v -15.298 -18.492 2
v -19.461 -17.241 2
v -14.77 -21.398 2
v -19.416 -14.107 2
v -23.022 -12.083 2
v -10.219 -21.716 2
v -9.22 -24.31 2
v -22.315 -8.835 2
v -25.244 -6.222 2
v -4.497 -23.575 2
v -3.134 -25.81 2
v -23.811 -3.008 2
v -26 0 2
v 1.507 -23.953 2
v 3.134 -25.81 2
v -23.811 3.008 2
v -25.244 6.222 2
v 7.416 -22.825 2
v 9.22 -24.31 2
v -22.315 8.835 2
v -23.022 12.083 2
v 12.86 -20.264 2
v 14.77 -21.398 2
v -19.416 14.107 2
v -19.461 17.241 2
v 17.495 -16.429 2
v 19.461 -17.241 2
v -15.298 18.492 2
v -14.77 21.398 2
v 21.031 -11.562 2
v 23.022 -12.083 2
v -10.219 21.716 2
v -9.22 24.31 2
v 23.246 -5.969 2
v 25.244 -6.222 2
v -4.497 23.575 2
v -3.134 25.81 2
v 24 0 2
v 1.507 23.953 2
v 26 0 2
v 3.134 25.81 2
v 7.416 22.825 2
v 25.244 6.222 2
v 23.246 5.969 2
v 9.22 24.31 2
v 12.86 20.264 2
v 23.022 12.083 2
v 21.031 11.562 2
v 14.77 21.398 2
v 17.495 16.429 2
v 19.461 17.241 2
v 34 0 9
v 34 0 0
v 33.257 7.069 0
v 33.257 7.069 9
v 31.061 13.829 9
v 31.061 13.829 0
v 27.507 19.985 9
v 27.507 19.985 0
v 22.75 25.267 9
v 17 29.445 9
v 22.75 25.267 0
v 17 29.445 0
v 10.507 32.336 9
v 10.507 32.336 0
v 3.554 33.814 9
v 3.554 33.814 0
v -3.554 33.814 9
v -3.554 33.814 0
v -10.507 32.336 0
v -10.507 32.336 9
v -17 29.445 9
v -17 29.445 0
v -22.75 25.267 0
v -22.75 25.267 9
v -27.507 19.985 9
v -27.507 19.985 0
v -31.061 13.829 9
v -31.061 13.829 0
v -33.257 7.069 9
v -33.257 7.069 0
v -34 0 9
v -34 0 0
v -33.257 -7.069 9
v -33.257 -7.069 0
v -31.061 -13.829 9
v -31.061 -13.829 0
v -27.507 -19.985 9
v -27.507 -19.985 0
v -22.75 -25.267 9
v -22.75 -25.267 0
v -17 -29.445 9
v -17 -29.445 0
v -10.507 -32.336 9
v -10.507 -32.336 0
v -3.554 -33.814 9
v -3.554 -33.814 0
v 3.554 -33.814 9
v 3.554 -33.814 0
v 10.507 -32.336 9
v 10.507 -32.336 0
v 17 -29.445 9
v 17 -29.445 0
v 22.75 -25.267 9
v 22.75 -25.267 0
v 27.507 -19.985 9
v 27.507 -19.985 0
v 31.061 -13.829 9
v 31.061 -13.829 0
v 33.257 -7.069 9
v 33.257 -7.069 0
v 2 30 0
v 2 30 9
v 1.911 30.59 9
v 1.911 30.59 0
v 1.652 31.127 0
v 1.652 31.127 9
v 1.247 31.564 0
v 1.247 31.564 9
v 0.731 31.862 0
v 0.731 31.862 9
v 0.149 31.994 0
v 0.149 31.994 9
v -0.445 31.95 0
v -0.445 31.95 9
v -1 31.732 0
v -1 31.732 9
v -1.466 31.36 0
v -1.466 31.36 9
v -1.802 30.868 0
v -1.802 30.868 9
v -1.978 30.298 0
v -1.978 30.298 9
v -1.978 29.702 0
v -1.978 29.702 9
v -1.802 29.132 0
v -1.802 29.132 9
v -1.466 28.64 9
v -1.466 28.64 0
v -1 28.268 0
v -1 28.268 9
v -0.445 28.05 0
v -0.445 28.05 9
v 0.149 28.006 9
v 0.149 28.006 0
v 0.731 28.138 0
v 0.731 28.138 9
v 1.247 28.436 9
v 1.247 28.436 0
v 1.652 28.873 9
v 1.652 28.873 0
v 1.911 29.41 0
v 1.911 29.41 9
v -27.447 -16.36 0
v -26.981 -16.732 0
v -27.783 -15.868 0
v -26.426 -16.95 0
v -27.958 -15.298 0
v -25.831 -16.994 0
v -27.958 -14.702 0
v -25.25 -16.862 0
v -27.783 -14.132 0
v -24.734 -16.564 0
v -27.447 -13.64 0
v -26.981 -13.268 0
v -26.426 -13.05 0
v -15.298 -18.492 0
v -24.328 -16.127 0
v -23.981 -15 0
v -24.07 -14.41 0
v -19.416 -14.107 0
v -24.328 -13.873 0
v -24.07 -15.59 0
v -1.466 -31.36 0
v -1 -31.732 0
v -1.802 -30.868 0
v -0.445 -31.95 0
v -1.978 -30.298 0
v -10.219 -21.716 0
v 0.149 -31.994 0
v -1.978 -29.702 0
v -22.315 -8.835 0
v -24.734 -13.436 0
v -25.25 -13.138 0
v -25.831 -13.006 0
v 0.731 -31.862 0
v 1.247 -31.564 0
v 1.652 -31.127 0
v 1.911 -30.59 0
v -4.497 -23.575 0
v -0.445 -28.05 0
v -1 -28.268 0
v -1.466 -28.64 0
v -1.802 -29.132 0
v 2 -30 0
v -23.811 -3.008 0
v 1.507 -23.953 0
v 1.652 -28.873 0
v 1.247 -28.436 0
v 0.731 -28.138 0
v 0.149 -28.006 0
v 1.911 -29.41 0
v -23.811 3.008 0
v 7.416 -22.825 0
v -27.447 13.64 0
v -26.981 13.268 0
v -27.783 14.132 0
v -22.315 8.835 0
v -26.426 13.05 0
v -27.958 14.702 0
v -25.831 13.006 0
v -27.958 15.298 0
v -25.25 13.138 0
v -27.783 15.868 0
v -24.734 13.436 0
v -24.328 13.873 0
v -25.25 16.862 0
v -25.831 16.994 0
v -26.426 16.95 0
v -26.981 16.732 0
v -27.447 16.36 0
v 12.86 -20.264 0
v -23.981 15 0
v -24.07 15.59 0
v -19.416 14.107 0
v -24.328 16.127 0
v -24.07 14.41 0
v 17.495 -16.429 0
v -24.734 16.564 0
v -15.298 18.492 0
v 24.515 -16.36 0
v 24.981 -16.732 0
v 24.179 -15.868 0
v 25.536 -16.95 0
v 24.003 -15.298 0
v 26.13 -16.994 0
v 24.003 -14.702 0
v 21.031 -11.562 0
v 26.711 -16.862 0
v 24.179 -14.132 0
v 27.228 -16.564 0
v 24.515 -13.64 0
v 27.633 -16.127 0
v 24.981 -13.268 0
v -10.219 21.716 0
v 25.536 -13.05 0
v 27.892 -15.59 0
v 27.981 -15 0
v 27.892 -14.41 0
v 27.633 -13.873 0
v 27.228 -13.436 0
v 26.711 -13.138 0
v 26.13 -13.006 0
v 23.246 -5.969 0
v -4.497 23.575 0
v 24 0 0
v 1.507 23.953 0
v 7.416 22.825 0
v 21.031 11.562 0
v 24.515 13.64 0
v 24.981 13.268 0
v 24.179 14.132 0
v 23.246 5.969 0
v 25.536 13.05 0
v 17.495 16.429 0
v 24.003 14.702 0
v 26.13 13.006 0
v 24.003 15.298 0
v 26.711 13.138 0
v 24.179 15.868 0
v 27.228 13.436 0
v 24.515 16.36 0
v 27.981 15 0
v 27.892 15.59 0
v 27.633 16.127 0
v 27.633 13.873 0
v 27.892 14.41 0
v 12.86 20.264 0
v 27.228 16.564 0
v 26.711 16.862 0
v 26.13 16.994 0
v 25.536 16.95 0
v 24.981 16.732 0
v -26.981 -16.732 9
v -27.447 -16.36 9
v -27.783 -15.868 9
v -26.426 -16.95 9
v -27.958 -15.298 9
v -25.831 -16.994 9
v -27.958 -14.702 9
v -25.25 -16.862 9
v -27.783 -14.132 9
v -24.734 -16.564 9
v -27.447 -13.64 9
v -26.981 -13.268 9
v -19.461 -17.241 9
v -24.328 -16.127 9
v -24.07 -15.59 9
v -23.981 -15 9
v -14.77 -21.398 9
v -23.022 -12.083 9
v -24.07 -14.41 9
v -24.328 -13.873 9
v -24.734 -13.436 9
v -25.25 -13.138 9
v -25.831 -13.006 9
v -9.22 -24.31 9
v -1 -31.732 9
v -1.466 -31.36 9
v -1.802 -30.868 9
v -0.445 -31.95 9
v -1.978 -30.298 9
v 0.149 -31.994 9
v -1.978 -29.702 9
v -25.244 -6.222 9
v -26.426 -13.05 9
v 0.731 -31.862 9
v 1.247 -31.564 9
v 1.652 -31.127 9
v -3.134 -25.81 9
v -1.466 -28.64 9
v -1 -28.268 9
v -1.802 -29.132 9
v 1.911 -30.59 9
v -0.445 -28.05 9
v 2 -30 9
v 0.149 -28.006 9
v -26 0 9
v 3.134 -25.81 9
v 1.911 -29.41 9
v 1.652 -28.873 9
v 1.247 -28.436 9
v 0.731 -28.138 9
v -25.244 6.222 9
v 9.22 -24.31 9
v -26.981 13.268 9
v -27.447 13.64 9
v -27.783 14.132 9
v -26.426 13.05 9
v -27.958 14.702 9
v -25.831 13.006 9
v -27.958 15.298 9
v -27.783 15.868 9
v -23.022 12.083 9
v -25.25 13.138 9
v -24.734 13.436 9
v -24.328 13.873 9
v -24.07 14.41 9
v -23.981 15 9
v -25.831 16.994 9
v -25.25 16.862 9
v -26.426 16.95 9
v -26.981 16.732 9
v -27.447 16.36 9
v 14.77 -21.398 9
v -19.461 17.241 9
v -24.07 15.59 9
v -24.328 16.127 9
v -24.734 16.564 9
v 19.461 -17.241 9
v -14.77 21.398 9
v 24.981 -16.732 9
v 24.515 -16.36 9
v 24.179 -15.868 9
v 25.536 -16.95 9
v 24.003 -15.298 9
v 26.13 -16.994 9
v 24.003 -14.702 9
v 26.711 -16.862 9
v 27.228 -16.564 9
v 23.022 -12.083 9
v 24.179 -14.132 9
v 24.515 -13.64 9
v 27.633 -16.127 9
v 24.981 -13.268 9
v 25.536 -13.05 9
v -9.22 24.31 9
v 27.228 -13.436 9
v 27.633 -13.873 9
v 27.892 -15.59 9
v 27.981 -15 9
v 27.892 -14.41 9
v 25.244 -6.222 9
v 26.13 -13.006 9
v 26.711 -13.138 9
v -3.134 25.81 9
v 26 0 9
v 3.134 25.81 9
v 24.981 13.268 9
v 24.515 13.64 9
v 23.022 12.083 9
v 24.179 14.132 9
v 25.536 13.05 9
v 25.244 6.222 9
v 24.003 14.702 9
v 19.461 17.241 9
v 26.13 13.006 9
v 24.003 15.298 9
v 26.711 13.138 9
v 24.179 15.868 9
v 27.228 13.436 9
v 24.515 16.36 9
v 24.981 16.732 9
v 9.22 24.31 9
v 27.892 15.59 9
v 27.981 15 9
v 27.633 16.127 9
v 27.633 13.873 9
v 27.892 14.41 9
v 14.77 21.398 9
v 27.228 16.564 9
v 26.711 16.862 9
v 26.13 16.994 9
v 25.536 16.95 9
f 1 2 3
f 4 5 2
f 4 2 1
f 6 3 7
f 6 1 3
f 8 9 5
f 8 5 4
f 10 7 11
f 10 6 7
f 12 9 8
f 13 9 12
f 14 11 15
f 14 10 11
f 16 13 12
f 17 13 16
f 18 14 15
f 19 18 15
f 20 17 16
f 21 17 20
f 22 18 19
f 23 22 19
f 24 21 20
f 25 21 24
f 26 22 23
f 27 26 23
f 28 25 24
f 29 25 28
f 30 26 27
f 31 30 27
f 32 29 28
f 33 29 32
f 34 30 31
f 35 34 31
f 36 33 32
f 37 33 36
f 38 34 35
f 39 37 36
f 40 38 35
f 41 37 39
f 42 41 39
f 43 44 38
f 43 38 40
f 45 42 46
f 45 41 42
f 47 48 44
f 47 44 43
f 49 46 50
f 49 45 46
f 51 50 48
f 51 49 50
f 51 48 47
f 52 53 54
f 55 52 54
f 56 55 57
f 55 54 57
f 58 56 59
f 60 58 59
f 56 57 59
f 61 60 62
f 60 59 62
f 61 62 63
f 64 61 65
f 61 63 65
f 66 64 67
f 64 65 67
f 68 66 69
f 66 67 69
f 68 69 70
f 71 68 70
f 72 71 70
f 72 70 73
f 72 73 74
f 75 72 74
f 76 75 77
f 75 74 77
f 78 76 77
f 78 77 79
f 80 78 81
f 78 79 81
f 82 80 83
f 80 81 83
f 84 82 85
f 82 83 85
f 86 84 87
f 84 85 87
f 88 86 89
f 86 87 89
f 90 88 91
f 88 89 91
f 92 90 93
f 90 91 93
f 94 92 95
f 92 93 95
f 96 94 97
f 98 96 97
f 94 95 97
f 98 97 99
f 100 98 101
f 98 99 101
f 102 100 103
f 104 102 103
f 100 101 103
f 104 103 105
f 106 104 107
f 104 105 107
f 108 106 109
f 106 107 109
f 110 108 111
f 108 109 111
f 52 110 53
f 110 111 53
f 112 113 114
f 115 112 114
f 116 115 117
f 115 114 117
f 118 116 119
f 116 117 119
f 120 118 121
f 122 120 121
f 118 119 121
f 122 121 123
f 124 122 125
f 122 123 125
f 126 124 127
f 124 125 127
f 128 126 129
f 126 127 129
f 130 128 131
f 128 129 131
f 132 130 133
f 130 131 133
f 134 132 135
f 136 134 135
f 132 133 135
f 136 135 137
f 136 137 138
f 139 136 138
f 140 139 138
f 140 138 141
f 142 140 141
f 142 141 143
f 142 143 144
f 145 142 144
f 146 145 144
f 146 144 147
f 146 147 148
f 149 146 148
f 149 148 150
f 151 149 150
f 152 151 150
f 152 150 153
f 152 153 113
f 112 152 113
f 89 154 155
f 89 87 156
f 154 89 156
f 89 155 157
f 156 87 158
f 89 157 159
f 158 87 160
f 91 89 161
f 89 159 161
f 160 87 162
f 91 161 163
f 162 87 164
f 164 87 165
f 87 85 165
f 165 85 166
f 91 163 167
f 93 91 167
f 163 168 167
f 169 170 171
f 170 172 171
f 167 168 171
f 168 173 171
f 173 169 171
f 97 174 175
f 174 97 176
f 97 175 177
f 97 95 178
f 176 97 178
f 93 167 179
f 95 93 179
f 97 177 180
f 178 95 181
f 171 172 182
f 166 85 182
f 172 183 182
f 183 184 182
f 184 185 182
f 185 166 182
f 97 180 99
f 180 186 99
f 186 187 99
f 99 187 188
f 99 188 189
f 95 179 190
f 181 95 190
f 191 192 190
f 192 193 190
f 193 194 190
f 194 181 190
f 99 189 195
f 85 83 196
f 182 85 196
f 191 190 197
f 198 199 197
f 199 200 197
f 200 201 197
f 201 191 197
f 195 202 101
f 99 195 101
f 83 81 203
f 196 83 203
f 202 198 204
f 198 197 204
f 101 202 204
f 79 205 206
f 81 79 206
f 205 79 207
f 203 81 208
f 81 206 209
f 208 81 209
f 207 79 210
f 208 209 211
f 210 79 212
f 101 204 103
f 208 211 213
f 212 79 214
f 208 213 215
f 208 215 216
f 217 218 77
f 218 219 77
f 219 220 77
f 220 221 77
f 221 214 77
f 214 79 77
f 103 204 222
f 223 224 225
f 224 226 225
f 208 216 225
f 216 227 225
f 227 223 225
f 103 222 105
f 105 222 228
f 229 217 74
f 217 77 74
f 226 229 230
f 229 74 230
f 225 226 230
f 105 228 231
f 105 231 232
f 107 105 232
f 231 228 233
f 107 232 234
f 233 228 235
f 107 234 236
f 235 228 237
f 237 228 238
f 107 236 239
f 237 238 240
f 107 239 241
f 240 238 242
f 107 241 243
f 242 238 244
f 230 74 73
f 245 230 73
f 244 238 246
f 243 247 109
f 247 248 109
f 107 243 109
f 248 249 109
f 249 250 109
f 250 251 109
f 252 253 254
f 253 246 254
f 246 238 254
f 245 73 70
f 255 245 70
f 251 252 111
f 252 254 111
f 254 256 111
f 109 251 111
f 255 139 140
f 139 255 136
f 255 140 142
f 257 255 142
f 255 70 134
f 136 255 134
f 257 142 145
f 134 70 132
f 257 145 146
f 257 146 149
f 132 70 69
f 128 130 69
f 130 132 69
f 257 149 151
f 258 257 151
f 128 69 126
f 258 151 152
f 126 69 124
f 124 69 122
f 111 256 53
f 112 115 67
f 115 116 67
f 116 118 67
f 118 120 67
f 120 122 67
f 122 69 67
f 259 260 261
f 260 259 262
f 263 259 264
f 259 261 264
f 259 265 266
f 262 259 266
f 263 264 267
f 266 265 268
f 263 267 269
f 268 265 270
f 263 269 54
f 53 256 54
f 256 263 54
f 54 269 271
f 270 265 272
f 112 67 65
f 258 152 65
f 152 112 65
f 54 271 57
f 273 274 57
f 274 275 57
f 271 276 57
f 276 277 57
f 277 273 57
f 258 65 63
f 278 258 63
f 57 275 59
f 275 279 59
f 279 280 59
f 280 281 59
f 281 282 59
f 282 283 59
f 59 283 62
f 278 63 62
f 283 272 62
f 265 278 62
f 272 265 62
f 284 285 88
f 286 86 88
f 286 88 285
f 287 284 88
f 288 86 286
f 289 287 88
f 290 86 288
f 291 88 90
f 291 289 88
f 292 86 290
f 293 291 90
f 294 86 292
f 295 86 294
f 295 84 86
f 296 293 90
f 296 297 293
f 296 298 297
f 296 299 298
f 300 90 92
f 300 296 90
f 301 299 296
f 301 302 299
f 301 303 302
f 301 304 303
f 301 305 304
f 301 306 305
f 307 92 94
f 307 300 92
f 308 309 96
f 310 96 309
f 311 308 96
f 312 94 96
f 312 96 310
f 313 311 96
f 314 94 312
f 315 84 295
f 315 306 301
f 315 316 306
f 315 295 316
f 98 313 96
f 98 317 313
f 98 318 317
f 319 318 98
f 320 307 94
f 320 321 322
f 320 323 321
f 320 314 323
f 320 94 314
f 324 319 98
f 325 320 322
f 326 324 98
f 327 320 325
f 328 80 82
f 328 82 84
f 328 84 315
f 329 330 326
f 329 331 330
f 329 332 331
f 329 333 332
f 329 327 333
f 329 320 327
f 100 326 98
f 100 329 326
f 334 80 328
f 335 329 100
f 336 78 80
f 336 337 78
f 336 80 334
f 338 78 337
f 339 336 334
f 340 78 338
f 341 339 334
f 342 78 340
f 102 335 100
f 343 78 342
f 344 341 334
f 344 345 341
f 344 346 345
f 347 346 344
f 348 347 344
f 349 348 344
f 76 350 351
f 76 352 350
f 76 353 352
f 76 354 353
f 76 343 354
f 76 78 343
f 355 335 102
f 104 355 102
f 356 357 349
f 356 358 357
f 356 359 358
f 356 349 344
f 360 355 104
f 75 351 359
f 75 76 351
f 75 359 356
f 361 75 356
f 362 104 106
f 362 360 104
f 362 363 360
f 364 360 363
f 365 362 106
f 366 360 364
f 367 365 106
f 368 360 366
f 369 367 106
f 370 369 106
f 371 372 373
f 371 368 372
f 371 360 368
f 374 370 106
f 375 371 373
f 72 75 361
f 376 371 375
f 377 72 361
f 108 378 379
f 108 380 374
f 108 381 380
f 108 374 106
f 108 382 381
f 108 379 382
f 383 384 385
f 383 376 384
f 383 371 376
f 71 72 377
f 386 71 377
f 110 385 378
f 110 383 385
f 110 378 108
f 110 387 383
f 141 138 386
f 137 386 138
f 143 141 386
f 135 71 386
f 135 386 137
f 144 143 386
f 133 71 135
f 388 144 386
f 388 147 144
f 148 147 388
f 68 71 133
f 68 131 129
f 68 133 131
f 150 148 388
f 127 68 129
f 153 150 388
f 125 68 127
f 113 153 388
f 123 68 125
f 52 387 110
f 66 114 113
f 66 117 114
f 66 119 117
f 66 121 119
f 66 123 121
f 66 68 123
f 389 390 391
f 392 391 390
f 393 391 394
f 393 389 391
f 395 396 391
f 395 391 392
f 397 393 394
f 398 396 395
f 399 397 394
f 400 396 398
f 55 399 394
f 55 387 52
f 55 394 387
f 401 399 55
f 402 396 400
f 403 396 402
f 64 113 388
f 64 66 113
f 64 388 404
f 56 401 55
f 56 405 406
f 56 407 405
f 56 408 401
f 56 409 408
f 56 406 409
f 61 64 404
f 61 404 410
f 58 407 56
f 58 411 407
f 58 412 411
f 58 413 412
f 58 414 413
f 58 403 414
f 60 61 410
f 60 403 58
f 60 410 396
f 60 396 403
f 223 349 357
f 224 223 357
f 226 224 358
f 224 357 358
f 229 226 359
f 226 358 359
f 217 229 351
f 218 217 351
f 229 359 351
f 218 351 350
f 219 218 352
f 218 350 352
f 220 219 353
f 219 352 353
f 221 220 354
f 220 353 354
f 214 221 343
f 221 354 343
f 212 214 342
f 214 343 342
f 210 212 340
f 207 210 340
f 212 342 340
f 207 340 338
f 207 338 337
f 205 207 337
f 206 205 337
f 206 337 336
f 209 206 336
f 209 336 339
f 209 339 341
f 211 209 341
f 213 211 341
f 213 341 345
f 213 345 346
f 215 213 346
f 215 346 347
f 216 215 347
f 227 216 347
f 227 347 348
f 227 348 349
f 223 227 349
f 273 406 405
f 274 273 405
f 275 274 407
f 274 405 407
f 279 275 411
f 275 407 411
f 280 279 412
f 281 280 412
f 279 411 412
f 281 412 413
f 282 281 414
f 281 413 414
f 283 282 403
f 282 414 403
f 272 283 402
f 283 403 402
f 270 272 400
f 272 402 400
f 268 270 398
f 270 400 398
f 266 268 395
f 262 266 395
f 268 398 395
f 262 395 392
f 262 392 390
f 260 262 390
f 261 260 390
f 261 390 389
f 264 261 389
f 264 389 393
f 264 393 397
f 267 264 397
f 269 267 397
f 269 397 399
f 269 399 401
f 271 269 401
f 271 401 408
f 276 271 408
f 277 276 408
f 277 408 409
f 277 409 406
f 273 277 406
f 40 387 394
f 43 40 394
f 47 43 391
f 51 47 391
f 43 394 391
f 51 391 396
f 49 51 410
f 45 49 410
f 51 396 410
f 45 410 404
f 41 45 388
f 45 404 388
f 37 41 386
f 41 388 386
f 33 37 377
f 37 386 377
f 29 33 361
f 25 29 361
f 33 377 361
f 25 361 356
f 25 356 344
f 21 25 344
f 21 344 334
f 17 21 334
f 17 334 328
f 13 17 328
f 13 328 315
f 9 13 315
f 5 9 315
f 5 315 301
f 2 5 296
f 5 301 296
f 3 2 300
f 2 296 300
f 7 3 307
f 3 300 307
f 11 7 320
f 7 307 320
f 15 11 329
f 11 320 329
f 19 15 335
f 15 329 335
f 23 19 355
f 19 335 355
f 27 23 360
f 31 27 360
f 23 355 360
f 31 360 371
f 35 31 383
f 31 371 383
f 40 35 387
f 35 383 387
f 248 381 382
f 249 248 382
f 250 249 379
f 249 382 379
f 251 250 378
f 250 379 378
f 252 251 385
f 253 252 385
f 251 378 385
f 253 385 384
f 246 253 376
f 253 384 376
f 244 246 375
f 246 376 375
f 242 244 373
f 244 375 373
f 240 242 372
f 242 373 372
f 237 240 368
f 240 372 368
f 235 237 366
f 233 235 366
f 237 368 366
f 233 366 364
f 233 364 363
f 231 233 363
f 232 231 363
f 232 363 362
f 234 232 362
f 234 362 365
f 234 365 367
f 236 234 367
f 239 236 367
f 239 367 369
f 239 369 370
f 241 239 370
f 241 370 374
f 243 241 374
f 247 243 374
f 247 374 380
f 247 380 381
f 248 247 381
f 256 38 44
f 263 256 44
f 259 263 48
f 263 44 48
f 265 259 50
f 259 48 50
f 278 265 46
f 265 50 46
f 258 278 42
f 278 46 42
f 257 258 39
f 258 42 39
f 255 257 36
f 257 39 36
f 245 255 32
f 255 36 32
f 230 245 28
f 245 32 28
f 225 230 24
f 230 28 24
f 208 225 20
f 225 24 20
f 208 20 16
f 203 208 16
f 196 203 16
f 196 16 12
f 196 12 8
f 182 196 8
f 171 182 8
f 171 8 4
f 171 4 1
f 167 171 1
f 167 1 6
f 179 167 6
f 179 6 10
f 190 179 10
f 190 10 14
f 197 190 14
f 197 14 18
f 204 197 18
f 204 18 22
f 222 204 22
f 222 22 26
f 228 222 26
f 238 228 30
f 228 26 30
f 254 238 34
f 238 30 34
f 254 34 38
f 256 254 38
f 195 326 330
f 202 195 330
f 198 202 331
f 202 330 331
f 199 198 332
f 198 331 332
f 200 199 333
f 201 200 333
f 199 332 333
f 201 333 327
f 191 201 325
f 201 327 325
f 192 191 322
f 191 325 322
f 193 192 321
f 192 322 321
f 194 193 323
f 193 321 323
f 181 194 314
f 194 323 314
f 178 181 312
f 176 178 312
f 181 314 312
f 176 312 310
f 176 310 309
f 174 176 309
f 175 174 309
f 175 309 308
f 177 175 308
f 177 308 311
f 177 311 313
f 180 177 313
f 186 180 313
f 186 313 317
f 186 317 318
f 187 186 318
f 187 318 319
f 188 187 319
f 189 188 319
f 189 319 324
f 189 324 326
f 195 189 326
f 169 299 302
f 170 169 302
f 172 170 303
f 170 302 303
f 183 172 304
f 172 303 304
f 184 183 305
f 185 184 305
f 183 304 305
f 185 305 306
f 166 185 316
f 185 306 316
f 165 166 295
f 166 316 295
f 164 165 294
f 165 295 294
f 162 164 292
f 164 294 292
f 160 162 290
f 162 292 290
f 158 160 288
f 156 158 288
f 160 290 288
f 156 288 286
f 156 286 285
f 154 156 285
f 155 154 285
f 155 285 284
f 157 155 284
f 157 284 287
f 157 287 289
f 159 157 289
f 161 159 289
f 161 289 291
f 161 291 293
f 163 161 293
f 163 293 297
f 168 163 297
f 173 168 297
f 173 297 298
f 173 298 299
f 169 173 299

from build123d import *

# Parameters (mm, degrees)
SKETCH_1_R          = 34
EXTRUDE_1_DEPTH     = 9
SKETCH_2_R          = 26
CUT_EXTRUDE_1_DEPTH = 7
SKETCH_3_R          = 24
CUT_EXTRUDE_2_DEPTH = 8
SKETCH_4_R          = 2
CUT_EXTRUDE_3_DEPTH = 49.918299235


with BuildPart() as part:
    # 草图1 → 凸台-拉伸1 (new body)
    with BuildSketch(Plane.XY):
        Circle(SKETCH_1_R)
    extrude(amount=EXTRUDE_1_DEPTH)

    # 草图2 → 切除-拉伸1 (cut)
    with BuildSketch(Plane.XY.offset(9)):
        Circle(SKETCH_2_R)
    extrude(amount=-CUT_EXTRUDE_1_DEPTH, mode=Mode.SUBTRACT)

    # 草图3 → 切除-拉伸2 (cut)
    with BuildSketch(Plane.XY.offset(2)):
        Circle(SKETCH_3_R)
    extrude(amount=-CUT_EXTRUDE_2_DEPTH, mode=Mode.SUBTRACT)

    # 草图4 → 切除-拉伸3 (cut, through all)
    with BuildSketch(Plane.XY.offset(9)):
        with Locations((0, 30)):
            Circle(SKETCH_4_R)
        with Locations((25.980762114, 15)):
            Circle(SKETCH_4_R)
        with Locations((25.980762114, -15)):
            Circle(SKETCH_4_R)
        with Locations((0, -30)):
            Circle(SKETCH_4_R)
        with Locations((-25.980762114, -15)):
            Circle(SKETCH_4_R)
        with Locations((-25.980762114, 15)):
            Circle(SKETCH_4_R)
    extrude(amount=-CUT_EXTRUDE_3_DEPTH, mode=Mode.SUBTRACT)


solid = part.part
